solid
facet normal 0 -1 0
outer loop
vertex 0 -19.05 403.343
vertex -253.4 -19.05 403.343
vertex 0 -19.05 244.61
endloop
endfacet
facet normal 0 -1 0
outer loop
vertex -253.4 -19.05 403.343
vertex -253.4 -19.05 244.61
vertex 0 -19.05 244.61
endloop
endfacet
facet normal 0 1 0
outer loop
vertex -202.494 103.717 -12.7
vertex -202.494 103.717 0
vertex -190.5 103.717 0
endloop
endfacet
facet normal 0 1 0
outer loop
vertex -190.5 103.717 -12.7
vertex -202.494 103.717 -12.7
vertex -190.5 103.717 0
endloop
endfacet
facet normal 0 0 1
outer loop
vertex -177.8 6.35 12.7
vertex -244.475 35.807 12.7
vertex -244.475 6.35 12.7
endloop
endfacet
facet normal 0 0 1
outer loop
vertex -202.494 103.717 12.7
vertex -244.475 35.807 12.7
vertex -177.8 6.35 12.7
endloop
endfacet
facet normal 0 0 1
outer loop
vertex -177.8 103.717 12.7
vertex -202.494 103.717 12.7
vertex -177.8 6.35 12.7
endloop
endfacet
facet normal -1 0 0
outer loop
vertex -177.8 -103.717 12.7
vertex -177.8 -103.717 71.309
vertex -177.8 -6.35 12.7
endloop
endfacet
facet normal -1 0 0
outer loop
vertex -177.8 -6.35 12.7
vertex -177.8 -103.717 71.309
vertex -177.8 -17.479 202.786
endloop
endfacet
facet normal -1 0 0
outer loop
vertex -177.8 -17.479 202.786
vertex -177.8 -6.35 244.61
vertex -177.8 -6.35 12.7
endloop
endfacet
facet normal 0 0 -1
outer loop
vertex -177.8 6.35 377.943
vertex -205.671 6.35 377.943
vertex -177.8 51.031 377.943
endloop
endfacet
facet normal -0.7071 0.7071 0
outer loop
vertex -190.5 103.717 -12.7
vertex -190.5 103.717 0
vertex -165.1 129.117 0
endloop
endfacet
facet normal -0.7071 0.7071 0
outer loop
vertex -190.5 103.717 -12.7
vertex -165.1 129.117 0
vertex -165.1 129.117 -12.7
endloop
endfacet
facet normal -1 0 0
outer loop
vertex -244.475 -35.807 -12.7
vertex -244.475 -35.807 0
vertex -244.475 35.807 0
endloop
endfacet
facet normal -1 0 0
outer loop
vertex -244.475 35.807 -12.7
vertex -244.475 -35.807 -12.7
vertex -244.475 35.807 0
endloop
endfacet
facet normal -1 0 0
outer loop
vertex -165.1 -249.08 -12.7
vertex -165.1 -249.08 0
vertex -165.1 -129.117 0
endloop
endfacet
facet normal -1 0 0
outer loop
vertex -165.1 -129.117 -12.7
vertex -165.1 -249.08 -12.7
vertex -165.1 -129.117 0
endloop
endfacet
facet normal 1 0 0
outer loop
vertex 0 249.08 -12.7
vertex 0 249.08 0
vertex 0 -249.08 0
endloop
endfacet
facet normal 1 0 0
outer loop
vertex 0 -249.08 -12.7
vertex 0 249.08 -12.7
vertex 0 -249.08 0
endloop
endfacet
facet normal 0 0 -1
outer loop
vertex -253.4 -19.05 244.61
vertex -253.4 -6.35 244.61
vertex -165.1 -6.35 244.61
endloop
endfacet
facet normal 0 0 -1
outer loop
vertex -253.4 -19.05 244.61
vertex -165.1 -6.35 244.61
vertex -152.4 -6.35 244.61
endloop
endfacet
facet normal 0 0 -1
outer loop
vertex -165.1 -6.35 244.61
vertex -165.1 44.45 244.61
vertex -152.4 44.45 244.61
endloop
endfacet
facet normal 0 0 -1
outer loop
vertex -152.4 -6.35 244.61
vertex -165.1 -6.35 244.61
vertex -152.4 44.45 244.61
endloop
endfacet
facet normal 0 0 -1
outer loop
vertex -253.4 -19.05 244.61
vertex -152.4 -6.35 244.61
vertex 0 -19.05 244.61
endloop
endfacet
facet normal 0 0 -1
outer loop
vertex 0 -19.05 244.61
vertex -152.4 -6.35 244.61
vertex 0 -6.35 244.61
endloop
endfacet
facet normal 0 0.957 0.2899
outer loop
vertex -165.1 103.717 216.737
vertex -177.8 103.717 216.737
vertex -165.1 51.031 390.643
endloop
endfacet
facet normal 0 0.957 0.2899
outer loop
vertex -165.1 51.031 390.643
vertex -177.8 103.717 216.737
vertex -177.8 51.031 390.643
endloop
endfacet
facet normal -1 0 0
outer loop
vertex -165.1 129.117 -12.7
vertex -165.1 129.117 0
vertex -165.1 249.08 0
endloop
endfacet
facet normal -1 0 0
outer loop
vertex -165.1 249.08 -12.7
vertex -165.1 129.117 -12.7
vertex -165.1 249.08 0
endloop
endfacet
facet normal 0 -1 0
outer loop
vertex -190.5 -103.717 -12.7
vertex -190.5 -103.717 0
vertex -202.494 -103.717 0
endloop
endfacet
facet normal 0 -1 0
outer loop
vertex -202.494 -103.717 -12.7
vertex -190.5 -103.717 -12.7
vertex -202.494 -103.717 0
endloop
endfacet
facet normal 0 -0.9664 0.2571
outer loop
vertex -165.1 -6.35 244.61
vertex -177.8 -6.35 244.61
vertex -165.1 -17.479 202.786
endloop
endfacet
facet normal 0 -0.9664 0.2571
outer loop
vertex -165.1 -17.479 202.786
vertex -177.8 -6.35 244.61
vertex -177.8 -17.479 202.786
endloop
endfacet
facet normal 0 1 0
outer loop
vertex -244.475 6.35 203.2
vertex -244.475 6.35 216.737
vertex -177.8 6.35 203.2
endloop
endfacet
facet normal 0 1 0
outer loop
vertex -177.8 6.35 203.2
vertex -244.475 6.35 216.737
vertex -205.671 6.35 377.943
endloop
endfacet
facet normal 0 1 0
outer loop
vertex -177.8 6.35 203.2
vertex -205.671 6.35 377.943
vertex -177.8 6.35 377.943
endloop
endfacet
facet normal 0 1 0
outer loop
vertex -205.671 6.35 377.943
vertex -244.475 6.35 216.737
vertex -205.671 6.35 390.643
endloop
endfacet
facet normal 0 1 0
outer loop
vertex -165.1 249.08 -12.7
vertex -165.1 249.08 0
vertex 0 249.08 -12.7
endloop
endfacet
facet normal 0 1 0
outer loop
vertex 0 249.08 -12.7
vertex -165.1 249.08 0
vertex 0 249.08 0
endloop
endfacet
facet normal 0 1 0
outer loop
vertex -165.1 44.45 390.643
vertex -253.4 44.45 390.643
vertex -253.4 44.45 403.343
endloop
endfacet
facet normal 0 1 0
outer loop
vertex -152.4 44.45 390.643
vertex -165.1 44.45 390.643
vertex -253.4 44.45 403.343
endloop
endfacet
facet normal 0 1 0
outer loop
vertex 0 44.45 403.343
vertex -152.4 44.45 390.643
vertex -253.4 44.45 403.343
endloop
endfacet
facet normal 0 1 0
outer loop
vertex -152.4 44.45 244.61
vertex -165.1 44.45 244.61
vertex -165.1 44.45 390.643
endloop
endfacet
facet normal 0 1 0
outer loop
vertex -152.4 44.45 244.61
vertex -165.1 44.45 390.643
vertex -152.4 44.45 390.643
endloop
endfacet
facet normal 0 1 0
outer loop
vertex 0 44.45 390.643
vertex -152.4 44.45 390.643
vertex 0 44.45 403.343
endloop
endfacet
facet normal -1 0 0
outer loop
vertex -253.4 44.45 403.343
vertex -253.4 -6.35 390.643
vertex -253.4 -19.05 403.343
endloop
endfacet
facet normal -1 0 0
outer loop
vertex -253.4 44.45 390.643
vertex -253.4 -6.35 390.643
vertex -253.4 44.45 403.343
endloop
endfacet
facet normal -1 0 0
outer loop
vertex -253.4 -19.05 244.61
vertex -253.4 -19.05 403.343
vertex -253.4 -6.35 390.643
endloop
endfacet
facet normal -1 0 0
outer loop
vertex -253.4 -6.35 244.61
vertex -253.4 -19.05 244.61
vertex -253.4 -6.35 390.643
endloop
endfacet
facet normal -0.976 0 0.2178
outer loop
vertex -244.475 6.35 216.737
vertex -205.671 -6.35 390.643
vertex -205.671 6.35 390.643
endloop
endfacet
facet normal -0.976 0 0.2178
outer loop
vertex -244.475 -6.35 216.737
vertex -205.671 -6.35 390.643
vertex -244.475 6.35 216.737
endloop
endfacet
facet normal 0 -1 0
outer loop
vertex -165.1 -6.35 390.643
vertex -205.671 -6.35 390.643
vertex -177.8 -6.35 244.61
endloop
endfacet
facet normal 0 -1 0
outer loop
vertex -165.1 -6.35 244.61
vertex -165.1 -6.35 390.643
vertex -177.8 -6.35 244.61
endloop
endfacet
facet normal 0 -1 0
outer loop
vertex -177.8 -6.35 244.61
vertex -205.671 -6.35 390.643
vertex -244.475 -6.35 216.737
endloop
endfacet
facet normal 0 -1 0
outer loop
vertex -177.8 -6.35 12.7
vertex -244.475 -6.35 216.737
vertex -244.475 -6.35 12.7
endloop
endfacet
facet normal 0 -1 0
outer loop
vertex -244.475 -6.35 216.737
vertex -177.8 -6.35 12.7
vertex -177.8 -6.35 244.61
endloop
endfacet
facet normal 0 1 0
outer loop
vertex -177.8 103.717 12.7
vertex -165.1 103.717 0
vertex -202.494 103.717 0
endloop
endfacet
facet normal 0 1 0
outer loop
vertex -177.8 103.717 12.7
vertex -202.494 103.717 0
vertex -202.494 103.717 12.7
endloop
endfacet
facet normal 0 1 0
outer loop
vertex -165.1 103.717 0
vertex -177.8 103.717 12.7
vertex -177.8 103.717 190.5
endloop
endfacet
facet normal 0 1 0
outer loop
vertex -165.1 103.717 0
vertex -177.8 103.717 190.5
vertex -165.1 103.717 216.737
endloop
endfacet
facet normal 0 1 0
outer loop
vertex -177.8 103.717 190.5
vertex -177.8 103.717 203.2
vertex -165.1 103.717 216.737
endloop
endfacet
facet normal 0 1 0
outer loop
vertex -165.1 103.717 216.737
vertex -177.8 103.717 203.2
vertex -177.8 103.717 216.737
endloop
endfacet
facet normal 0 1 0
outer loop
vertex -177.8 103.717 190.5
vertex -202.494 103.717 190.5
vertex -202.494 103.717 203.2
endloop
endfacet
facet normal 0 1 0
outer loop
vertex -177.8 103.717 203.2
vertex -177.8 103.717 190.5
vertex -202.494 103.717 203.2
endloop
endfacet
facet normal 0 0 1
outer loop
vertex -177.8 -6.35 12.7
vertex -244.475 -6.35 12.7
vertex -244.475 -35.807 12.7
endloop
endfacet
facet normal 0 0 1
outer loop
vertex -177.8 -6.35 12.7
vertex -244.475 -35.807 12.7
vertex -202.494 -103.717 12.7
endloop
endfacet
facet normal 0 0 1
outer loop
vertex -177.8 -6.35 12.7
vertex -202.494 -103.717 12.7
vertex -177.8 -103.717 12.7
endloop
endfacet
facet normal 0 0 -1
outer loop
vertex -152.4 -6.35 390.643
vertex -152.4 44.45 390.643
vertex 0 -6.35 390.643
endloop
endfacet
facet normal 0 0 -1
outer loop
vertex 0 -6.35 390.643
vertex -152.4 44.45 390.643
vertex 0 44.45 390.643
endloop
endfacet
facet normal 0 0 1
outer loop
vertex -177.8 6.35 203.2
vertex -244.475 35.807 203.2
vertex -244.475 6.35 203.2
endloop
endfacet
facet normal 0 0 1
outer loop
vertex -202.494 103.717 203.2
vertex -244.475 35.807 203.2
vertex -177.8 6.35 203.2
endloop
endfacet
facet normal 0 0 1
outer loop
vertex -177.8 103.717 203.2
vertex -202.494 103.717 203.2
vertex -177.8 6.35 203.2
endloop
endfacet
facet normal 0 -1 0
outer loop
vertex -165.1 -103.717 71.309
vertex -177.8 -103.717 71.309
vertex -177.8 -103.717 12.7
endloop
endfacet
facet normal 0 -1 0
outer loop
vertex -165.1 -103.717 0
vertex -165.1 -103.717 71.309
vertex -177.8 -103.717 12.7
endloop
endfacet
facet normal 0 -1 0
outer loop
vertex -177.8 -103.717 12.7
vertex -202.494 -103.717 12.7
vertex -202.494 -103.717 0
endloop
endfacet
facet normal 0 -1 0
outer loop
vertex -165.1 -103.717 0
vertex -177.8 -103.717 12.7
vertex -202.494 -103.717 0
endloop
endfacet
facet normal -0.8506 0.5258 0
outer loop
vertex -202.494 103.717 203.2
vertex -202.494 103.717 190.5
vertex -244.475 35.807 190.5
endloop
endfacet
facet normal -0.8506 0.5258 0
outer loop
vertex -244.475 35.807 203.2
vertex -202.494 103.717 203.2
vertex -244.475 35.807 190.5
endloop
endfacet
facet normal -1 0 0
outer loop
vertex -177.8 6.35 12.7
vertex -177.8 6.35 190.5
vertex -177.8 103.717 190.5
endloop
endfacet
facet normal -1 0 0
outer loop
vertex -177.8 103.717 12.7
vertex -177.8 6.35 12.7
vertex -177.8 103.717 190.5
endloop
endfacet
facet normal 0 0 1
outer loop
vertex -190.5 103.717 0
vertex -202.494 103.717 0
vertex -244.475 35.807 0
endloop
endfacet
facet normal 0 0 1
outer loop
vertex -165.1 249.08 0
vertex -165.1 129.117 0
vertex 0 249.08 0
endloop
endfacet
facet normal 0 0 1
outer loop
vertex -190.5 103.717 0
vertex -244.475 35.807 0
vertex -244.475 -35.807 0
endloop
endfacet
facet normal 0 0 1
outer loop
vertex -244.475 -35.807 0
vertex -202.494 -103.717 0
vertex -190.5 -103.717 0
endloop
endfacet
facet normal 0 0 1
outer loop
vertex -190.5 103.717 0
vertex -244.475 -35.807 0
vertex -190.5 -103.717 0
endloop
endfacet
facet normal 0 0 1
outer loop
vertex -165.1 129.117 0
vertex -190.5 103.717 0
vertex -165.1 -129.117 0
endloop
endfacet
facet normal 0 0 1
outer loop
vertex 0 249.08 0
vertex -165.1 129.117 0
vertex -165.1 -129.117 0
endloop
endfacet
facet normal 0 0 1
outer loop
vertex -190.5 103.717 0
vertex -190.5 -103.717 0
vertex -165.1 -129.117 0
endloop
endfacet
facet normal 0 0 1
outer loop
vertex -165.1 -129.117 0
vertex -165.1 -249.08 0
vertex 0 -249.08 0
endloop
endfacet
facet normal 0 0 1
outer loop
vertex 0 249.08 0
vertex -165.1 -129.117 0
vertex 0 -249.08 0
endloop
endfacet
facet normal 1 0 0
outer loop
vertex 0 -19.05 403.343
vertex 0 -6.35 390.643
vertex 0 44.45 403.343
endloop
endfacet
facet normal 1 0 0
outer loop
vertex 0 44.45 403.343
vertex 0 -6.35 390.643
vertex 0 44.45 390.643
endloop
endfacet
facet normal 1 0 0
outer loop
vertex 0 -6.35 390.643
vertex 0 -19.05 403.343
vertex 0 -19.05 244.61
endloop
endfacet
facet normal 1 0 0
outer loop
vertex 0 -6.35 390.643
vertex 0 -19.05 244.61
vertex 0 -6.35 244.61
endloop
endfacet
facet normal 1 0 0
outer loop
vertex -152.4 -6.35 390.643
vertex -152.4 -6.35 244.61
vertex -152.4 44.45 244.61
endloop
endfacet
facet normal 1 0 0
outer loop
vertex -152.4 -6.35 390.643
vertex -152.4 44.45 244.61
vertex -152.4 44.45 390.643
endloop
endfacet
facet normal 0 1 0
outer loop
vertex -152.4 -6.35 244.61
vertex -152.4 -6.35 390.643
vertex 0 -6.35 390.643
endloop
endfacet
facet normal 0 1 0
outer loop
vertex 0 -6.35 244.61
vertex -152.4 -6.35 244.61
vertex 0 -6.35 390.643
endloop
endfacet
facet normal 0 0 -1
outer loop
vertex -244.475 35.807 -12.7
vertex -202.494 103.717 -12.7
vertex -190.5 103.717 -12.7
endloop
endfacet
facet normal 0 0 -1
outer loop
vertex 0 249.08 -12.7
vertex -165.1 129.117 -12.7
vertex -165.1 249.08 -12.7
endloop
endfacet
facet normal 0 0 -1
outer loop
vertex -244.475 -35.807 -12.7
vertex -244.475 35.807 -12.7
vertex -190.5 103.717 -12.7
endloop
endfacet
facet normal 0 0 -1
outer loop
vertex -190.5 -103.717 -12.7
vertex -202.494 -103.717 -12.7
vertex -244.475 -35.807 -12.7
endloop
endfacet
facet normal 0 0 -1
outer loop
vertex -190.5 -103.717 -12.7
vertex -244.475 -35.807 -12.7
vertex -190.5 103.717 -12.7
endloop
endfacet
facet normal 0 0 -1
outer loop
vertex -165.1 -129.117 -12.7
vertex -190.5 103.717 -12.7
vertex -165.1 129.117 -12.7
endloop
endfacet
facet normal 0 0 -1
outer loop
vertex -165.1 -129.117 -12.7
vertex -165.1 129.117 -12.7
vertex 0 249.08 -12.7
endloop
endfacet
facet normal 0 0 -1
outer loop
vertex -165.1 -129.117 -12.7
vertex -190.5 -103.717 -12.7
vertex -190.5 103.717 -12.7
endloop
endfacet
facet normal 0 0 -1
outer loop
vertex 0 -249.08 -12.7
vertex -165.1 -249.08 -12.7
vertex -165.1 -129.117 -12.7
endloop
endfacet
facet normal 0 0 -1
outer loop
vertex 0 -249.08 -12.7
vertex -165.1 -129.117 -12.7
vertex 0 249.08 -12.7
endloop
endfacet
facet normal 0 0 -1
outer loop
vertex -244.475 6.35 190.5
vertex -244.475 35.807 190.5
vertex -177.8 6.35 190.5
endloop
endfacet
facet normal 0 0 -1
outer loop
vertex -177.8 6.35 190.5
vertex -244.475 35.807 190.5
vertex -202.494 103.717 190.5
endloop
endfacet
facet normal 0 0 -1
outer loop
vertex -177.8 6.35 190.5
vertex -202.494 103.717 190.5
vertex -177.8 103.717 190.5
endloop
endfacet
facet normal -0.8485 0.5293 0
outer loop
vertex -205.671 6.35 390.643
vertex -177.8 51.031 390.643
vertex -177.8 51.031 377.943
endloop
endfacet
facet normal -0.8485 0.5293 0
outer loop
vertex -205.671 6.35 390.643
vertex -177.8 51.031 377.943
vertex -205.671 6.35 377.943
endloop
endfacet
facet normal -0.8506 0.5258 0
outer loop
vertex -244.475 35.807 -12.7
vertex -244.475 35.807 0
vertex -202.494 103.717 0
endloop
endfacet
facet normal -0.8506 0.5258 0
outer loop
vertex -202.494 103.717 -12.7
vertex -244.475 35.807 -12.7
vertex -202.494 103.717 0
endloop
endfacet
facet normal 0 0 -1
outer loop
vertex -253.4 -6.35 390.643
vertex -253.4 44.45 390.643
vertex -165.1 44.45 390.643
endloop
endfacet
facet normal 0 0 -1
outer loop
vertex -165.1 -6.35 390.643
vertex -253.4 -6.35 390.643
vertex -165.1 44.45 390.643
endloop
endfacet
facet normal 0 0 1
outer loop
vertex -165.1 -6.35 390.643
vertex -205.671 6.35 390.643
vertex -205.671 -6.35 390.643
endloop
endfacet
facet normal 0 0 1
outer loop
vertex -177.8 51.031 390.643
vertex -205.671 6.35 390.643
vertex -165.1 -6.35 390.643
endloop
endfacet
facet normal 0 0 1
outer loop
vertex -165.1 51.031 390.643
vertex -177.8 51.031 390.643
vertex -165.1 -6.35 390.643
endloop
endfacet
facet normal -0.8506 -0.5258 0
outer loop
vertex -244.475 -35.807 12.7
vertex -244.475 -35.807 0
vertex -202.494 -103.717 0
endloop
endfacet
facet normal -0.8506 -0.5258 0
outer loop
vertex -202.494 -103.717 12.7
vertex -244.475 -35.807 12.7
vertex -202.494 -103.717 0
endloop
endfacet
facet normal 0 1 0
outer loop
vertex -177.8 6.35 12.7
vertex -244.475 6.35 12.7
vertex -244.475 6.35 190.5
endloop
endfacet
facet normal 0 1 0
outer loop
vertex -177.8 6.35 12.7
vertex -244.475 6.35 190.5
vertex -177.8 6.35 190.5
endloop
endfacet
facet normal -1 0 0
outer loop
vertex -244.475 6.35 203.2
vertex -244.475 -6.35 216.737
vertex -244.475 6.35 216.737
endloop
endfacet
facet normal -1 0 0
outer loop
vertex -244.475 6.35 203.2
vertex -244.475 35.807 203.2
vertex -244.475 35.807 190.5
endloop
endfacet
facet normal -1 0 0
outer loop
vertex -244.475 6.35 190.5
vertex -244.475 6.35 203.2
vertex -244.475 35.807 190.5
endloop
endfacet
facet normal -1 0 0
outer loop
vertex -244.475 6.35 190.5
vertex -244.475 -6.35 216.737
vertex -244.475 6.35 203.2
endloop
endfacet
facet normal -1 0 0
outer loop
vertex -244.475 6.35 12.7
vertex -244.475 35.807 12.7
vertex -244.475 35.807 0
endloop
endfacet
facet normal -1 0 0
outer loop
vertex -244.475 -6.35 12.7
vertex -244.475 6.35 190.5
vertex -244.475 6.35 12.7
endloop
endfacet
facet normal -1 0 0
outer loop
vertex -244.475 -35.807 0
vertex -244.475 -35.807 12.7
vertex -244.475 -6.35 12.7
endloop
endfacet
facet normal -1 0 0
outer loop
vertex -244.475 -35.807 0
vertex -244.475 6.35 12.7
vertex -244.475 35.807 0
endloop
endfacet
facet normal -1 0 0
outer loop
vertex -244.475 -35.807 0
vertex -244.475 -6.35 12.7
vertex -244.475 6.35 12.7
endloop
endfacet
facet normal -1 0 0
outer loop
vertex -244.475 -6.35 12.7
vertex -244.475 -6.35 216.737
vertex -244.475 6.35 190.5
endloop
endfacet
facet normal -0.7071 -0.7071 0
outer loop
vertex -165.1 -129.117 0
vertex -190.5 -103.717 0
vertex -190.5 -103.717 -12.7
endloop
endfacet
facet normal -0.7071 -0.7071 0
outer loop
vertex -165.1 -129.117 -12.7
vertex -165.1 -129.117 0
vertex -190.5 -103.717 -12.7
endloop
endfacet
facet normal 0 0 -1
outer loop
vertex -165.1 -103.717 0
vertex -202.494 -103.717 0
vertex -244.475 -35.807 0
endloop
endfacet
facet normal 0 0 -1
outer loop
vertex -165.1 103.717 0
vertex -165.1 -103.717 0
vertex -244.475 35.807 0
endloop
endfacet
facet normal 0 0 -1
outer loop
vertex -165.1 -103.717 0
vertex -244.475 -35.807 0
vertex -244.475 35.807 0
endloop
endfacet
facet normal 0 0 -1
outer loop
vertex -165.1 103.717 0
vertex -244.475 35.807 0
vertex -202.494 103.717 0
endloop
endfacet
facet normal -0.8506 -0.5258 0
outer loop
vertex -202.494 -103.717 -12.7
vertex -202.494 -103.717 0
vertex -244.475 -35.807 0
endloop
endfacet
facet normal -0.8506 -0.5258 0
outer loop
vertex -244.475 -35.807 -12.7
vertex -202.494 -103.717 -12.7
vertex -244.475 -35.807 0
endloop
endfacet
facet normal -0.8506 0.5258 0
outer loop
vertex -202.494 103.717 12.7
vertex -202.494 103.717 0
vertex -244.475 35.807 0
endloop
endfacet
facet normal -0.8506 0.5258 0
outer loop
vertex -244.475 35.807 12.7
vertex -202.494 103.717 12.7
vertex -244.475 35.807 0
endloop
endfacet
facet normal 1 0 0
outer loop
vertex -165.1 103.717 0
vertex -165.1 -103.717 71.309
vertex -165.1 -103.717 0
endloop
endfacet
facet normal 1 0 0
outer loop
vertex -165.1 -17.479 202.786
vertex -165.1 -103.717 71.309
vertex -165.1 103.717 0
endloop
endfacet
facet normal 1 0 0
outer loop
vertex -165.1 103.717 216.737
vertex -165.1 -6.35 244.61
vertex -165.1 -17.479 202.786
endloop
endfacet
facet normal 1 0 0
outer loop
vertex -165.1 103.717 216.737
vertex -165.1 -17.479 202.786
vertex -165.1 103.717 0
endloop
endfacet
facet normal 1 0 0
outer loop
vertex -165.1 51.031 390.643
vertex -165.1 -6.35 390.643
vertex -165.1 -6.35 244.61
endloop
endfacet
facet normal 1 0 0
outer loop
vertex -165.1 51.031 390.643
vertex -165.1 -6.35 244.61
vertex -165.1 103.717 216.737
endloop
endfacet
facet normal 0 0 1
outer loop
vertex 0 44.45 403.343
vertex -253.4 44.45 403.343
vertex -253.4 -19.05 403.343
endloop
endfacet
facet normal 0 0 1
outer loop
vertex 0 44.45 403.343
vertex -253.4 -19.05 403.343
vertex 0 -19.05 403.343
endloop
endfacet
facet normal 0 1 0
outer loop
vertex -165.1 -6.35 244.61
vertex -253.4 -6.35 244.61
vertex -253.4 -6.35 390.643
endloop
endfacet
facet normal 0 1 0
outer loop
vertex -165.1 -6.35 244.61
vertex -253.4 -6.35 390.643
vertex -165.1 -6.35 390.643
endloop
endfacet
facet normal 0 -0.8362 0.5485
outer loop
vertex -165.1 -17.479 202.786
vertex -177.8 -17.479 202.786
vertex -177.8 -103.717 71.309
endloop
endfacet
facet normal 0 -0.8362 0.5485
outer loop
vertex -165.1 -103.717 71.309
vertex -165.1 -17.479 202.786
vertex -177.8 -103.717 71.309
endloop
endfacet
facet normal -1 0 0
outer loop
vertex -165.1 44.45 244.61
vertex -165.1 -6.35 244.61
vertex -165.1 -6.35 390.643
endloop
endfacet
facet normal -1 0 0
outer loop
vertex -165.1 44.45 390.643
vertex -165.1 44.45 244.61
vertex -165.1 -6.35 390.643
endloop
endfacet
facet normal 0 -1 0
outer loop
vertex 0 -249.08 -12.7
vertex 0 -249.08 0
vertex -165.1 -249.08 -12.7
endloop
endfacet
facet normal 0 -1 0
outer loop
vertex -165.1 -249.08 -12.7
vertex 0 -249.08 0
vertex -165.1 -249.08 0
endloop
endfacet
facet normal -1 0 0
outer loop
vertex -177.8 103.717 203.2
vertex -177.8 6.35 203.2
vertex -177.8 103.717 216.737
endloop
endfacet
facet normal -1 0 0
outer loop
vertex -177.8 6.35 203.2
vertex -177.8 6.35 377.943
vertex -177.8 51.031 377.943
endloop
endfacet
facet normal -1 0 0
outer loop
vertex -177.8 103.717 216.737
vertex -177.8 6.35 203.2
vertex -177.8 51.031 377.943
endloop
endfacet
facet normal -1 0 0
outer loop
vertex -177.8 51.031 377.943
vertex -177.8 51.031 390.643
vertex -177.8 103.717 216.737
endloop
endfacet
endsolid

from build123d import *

# Parameters (mm, degrees)
F1_DEPTH      = 12.7
F3_DEPTH      = 12.7
F5_DEPTH      = 6.35
F5_DEPTH_BACK = 6.35
F7_DEPTH      = 25.4
F8_START      = 177.8
F8_DEPTH      = 12.7
F10_DEPTH     = 12.7
F12_DEPTH     = 12.7
F13_SIZE      = 25.4
F14_W         = 253.4000277519
F14_H         = 146.0330784321
F15_DEPTH     = 12.7
F16_W         = 12.7
F16_H         = 146.0330784321
F17_DEPTH     = 50.8
F18_W         = 253.4000277519
F18_H         = 63.5
F19_DEPTH     = 12.7


with BuildPart() as f1:
    # F0 (on Top) → F1 (new body)
    with BuildSketch(Plane.XY):
        Polygon((-244.4749832617, 35.8069409784), (-244.4749832617, 0), (-244.4749832617, -35.8069409784), (-202.4944386959, -103.7166595656), (-177.8, -103.7166595656), (-177.8, 0), (-177.8, 103.7166595656), (-202.4944386959, 103.7166595656), align=None)
    extrude(amount=F1_DEPTH)

    # F2 (on face) → F3 (join)
    with BuildSketch(Plane.YZ.offset(-177.8)):
        Polygon((-103.7166595656, 216.7370766401), (-103.7166595656, 0), (0, 0), (0, 390.6428515911), (-51.0313883424, 390.6428515911), align=None)
        Polygon((0, 390.6428515911), (0, 0), (103.7166595656, 0), (103.7166595656, 216.7370766401), (51.0313883424, 390.6428515911), align=None)
    extrude(amount=F3_DEPTH)

    # F4 (on Front) → F5 (join, two sides)
    with BuildSketch(Plane.XZ) as f5_sk:
        Polygon((-202.4944386959, 12.7), (-177.8, 12.7), (-177.8, 216.7370766401), (-177.8, 390.6428515911), (-205.6709676981, 390.6428515911), (-244.4749832617, 216.7370766401), (-244.4749832617, 12.7), align=None)
    extrude(amount=F5_DEPTH)
    extrude(f5_sk.sketch, amount=-F5_DEPTH_BACK)

    # F6 (on face) → F7 (cut)
    with BuildSketch(Plane(origin=(-177.8, 0, 0), x_dir=(0, -1, 0), z_dir=(-1, 0, 0))):
        Polygon((51.0313883424, 390.6428515911), (6.35, 390.6428515911), (6.35, 244.609773159), (17.4792539328, 202.7855962515), (84.4946950674, 216.7370766401), (103.7166595656, 216.7370766401), align=None)
        Polygon((84.4946950674, 216.7370766401), (17.4792539328, 202.7855962515), (103.7166595656, 71.3086128235), (103.7166595656, 216.7370766401), align=None)
    extrude(amount=-F7_DEPTH, mode=Mode.SUBTRACT)

    # F5_face1 (on face) → F8 (join)
    with BuildSketch(Plane(origin=(-205.6951011652, 47.7051250828, 12.7), x_dir=(1, 0, 0), z_dir=(0, 0, 1)).offset(F8_START)):
        Polygon((-38.7798820965, -11.8981841043), (-38.7798820965, -41.3551250828), (27.8951011652, -41.3551250828), (27.8951011652, 56.0115344828), (3.2006624693, 56.0115344828), align=None)
    extrude(amount=F8_DEPTH)

    # F9 (on face) → F10 (join)
    with BuildSketch(Plane.XY.offset(390.6428515911)):
        Polygon((-177.8, 6.35), (-177.8, 51.0313883424), (-205.6709676981, 6.35), align=None)
    extrude(amount=-F10_DEPTH)


with BuildPart() as f12:
    # F11 (on face) → F12 (new body)
    with BuildSketch(Plane(origin=(0, 0, 0), x_dir=(1, 0, 0), z_dir=(0, 0, -1))):
        Polygon((-165.1, -103.7166595656), (-165.1, 103.7166595656), (-202.4944386959, 103.7166595656), (-244.4749832617, 35.8069409784), (-244.4749832617, -35.8069409784), (-202.4944386959, -103.7166595656), align=None)
        Polygon((-165.1, 249.0800619125), (-165.1, 103.7166595656), (-165.1, -103.7166595656), (-165.1, -249.0800619125), (0, -249.0800619125), (0, 249.0800619125), align=None)
    extrude(amount=F12_DEPTH)

    # F13
    f13_edges = [f12.edges().sort_by_distance(p)[0] for p in [
        (-165.1, -103.71666, -6.35),
        (-165.1, 103.71666, -6.35),
    ]]
    chamfer(f13_edges, length=F13_SIZE)


with BuildPart() as f15:
    # F14 (on face) → F15 (new body)
    with BuildSketch(Plane.XZ.offset(6.35)):
        with Locations((-126.700013876, 317.6263123751)):
            Rectangle(F14_W, F14_H)
    extrude(amount=F15_DEPTH)

    # F16 (on face) → F17 (join)
    with BuildSketch(Plane(origin=(0, -6.35, 0), x_dir=(-1, 0, 0), z_dir=(0, 1, 0))):
        with Locations((158.75, 317.6263123751)):
            Rectangle(F16_W, F16_H)
    extrude(amount=F17_DEPTH)

    # F18 (on face) → F19 (join)
    with BuildSketch(Plane.XY.offset(390.6428515911)):
        with Locations((-126.700013876, 12.7)):
            Rectangle(F18_W, F18_H)
    extrude(amount=F19_DEPTH)


solid = Compound([f1.part, f12.part, f15.part])
